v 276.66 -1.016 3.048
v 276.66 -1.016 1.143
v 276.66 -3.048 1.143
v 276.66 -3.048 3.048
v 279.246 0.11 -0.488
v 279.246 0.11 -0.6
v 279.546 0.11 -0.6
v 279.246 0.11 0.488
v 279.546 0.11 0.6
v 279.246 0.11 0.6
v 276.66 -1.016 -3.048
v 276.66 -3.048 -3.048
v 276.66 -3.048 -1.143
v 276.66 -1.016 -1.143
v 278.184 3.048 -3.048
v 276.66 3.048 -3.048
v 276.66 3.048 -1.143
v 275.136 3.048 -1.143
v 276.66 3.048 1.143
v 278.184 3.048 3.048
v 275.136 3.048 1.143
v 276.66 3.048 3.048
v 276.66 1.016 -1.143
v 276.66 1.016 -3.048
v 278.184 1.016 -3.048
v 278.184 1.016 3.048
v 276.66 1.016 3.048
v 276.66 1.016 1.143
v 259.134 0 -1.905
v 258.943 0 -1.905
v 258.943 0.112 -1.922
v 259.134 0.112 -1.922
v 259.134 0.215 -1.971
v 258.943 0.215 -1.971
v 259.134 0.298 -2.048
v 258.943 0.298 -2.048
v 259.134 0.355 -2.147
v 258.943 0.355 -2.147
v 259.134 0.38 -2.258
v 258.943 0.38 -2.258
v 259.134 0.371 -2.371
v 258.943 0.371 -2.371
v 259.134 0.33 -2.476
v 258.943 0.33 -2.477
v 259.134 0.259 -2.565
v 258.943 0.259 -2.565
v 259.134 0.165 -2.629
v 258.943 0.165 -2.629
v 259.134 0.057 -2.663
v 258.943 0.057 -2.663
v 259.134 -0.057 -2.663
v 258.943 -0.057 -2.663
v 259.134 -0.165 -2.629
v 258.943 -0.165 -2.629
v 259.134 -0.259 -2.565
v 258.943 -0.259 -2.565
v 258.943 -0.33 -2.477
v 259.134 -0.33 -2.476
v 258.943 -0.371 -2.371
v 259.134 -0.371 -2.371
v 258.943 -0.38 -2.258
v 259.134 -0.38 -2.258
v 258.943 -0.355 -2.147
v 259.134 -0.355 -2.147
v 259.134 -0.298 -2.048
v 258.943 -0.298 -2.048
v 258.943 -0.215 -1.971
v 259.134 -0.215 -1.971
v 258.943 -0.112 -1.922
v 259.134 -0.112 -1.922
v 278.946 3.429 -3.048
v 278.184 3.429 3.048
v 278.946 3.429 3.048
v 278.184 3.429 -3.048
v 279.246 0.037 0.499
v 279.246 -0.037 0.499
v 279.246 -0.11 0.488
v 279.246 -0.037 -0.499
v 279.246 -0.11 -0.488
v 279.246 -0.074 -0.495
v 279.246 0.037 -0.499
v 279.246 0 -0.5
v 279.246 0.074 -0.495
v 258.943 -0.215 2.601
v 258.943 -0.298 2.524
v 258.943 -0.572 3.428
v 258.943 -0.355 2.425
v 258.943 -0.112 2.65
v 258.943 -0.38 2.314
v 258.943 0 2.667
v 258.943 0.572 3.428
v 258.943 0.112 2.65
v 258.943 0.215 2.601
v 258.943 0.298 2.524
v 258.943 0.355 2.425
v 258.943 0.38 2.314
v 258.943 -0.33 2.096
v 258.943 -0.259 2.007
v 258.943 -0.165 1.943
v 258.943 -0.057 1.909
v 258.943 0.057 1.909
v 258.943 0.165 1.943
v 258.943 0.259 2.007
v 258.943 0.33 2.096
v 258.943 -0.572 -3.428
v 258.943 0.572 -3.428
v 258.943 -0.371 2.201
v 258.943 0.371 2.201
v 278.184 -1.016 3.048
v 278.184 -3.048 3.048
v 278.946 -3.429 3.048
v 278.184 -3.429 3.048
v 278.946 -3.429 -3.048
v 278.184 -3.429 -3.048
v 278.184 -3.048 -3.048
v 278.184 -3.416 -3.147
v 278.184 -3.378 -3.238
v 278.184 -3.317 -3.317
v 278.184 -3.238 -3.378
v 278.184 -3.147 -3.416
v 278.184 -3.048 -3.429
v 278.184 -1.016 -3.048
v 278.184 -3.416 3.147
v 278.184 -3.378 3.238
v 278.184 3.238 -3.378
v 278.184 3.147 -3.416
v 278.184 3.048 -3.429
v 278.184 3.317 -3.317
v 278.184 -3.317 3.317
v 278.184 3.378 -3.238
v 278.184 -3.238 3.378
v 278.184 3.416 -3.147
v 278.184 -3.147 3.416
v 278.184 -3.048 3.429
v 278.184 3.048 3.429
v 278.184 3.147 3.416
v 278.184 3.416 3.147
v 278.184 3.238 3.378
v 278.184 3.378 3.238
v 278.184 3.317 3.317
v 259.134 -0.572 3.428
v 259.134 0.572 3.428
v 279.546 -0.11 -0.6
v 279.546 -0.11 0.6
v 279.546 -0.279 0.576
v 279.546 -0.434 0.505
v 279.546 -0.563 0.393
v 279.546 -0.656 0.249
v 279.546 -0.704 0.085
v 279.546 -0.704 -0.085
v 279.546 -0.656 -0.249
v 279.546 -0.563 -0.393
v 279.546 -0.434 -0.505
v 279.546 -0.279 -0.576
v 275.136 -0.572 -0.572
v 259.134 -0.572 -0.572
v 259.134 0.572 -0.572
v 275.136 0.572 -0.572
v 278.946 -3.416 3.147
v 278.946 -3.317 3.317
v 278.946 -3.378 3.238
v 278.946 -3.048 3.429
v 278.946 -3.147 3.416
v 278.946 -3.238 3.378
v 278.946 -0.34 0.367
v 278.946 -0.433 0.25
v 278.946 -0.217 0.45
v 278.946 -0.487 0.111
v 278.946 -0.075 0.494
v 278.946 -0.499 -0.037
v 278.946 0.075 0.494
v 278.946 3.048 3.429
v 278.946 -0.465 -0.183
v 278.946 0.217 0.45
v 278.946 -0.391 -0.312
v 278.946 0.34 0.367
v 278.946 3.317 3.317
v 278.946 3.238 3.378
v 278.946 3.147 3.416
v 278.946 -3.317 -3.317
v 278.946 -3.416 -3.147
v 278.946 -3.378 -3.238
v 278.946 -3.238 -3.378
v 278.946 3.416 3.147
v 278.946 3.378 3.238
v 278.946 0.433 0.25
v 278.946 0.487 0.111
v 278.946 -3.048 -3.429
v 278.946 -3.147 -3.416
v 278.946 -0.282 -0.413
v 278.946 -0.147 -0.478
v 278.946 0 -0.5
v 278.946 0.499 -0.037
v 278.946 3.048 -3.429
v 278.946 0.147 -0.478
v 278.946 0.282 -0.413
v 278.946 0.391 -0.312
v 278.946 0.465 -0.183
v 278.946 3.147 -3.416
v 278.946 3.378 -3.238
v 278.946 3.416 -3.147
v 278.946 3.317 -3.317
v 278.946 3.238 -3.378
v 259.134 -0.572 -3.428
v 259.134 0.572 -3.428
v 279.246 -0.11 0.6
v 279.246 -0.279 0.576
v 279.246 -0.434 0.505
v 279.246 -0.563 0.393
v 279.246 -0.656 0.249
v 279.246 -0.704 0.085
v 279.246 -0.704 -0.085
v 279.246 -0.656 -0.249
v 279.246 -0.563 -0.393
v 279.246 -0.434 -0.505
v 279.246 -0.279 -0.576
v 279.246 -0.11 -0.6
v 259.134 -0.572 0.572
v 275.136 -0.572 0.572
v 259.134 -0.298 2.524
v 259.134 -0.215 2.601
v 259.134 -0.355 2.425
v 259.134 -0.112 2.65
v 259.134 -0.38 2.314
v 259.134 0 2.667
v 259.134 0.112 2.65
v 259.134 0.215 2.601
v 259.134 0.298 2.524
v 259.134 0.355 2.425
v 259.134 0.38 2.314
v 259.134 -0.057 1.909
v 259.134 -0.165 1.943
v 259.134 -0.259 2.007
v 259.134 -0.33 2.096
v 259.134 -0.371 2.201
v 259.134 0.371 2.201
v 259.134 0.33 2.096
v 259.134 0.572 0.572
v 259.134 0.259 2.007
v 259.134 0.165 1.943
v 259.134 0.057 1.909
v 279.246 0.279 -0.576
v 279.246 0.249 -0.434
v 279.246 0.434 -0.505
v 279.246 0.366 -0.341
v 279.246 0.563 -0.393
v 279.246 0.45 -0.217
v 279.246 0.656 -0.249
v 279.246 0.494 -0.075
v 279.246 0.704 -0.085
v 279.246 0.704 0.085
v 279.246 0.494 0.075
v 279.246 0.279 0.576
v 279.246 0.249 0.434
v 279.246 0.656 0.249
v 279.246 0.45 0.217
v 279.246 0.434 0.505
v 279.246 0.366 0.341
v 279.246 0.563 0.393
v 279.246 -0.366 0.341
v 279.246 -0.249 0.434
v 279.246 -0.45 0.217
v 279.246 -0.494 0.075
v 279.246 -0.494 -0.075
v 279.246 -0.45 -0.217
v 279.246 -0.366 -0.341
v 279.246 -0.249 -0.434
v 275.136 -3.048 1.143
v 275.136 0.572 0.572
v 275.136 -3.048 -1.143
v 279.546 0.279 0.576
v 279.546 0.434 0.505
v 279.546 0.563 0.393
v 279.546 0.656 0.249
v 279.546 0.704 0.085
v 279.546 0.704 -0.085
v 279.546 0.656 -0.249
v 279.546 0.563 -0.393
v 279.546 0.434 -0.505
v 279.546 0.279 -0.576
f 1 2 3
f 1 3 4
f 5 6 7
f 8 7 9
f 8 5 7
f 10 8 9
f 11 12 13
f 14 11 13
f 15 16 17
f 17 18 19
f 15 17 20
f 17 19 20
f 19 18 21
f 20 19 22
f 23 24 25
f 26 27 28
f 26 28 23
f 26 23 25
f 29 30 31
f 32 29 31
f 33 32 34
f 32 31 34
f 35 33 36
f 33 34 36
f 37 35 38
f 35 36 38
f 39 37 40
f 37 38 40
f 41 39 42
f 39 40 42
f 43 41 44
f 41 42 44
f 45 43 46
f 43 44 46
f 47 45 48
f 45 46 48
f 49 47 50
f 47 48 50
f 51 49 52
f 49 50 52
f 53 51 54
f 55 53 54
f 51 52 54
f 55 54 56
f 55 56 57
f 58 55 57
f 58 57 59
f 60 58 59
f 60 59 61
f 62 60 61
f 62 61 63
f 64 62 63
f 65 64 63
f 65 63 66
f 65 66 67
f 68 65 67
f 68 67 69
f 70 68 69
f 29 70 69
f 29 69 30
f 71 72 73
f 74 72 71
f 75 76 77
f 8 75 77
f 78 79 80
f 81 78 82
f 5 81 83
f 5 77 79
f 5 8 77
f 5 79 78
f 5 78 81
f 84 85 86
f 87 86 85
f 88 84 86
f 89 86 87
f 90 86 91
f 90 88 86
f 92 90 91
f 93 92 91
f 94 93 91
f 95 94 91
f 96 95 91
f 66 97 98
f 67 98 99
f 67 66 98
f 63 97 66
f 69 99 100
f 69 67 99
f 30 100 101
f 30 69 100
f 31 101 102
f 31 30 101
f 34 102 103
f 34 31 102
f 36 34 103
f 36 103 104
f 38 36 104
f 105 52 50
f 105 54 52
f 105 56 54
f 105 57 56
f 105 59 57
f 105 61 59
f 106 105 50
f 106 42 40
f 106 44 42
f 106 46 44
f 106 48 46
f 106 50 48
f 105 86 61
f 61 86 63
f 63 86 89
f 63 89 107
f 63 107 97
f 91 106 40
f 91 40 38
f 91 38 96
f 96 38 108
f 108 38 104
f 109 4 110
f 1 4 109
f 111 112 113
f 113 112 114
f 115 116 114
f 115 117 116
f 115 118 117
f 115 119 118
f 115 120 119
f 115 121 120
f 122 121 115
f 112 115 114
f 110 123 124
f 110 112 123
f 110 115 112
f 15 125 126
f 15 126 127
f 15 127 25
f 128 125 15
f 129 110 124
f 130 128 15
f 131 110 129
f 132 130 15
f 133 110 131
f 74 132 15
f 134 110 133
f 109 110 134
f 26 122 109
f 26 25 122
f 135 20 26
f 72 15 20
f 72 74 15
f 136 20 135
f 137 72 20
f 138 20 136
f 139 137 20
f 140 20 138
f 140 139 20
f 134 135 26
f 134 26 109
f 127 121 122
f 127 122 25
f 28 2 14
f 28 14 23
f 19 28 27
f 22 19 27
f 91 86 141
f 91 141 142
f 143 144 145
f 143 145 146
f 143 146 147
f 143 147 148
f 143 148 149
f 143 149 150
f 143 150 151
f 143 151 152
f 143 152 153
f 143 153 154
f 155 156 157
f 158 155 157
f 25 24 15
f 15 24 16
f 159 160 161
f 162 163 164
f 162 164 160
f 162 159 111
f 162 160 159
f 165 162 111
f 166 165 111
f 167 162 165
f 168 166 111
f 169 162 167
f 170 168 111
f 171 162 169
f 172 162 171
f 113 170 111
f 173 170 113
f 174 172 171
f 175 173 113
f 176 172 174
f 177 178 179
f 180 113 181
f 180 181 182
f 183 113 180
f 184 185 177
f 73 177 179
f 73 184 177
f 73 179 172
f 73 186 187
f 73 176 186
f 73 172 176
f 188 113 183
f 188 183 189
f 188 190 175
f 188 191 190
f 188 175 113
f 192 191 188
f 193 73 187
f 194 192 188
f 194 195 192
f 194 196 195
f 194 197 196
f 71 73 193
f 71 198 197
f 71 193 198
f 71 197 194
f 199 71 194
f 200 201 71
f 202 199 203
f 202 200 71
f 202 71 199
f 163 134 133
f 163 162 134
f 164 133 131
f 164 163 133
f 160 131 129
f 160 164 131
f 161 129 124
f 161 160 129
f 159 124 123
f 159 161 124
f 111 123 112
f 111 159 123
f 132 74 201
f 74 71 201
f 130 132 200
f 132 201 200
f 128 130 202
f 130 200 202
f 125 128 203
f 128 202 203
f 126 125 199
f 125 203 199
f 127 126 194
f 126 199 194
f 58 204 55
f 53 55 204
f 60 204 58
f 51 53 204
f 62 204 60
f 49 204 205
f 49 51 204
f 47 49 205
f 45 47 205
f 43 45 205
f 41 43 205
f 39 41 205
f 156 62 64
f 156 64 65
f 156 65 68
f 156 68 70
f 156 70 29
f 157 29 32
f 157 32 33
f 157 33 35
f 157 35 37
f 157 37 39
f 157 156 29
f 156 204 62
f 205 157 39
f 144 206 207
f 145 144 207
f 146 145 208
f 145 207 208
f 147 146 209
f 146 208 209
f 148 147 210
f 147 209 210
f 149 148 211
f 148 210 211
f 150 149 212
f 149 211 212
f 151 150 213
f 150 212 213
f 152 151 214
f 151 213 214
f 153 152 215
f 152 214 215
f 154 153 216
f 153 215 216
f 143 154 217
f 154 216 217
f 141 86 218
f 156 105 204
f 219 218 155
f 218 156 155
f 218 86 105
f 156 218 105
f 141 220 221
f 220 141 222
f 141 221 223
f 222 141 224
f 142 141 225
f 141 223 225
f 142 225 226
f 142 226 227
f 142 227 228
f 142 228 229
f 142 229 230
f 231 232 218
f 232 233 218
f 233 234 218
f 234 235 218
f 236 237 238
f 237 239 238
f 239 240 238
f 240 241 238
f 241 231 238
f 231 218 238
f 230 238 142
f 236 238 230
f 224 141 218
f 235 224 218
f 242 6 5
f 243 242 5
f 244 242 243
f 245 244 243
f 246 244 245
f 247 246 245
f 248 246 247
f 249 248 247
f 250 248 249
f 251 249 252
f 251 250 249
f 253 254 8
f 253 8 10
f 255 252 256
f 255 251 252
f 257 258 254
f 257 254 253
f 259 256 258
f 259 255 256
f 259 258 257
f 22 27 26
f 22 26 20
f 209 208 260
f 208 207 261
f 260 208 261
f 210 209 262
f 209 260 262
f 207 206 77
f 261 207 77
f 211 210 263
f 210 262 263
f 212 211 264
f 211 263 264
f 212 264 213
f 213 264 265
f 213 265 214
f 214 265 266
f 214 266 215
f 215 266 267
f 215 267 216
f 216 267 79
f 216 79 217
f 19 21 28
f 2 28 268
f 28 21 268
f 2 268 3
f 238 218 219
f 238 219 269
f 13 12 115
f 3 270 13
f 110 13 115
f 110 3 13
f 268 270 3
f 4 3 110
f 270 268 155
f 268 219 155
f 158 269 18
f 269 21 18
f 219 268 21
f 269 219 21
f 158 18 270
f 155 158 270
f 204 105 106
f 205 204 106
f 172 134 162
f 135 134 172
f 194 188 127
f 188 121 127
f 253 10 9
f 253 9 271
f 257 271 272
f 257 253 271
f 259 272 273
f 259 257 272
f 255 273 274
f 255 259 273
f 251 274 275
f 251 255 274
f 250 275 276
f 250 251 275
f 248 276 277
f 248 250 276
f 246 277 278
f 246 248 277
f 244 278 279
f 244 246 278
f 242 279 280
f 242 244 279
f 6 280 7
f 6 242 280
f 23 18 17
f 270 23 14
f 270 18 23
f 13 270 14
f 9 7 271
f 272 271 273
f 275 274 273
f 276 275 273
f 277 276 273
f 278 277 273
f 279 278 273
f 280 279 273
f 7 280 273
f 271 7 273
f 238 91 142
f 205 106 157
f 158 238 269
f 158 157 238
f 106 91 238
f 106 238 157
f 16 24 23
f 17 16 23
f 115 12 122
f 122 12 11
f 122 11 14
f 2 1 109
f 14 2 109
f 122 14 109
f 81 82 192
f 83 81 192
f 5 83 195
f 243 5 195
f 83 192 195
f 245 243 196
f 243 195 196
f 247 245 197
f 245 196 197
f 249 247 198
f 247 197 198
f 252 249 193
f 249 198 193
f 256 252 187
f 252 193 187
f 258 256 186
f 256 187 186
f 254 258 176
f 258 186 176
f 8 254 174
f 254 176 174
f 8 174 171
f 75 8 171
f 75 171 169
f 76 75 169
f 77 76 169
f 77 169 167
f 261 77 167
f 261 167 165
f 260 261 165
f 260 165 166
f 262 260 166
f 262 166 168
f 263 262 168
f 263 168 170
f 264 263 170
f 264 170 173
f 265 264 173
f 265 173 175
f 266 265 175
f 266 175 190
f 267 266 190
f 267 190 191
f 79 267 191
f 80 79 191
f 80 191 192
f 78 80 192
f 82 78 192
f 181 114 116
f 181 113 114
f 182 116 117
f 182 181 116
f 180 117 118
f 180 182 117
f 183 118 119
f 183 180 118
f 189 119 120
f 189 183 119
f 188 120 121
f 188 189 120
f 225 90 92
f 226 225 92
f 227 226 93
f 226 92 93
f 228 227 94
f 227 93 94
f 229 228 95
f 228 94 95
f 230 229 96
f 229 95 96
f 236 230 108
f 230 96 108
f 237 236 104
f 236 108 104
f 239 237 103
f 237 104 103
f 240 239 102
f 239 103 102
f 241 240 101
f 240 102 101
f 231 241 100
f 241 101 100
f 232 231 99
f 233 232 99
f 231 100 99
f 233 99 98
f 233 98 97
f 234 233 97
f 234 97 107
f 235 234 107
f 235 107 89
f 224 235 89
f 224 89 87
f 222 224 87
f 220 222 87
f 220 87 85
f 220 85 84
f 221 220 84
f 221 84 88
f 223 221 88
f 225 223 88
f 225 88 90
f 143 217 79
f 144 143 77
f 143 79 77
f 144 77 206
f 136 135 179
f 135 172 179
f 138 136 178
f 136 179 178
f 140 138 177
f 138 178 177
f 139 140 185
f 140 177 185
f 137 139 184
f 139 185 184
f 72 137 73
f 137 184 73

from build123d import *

# Parameters (mm, degrees)
SKETCH1_W           = 101.6
SKETCH1_H           = 19.05
BOSS_EXTRUDE1_DEPTH = 3.175
SKETCH2_W           = 19.05
SKETCH2_H           = 19.05
BOSS_EXTRUDE2_DEPTH = 266.7
SKETCH4_W           = 114.3
SKETCH4_H           = 114.3
BOSS_EXTRUDE3_DEPTH = 76.2
SKETCH5_W           = 25.4
SKETCH5_H           = 38.1
CUT_EXTRUDE2_DEPTH  = 150.368
SKETCH7_OUTSIDE_W   = 192.692
SKETCH7_OUTSIDE_H   = 192.692
SKETCH7_OUTSIDE_W_2 = 101.6
SKETCH7_OUTSIDE_H_2 = 101.6
CUT_EXTRUDE3_DEPTH  = 50.8
SKETCH8_W           = 25.4
SKETCH8_H           = 33.866666666
CUT_EXTRUDE4_DEPTH  = 140.208
SKETCH9_W           = 114.3
SKETCH9_H           = 114.3
CUT_EXTRUDE5_DEPTH  = 12.7
FILLET2_R           = 6.35
SKETCH10_R          = 6.35
CUT_EXTRUDE6_DEPTH  = 12.7
SCALE1_SCALE        = 0.06
MOVE_FACE1_BY       = 0.380000002
MOVE_FACE1_2_BY     = 0.380000002
SKETCH12_R          = 0.5
BOSS_EXTRUDE4_DEPTH = 0.3
BOSS_EXTRUDE5_DEPTH = 0.3


with BuildPart() as part:
    # Sketch1 → Boss-Extrude1 (new body)
    with BuildSketch(Plane(origin=(0, 0, 0), x_dir=(0, 0, -1), z_dir=(1, 0, 0))):
        Rectangle(SKETCH1_W, SKETCH1_H)
    extrude(amount=BOSS_EXTRUDE1_DEPTH)

    # Sketch2 → Boss-Extrude2 (add)
    with BuildSketch(Plane(origin=(3.175, 0, 0), x_dir=(0, 0, -1), z_dir=(1, 0, 0))):
        Rectangle(SKETCH2_W, SKETCH2_H)
    extrude(amount=BOSS_EXTRUDE2_DEPTH)

    # Sketch4 → Boss-Extrude3 (add)
    with BuildSketch(Plane(origin=(269.875, 0, 0), x_dir=(0, 0, -1), z_dir=(1, 0, 0))):
        Rectangle(SKETCH4_W, SKETCH4_H)
    extrude(amount=BOSS_EXTRUDE3_DEPTH)

    # Sketch5 → Cut-Extrude2 (cut)
    with BuildSketch(Plane.XZ.offset(57.15)):
        with Locations((282.575, 38.1)):
            Rectangle(SKETCH5_W, SKETCH5_H)
        with Locations((282.575, -38.1)):
            Rectangle(SKETCH5_W, SKETCH5_H)
    extrude(amount=-CUT_EXTRUDE2_DEPTH, mode=Mode.SUBTRACT)

    # Sketch7 outside → Cut-Extrude3 (cut)
    with BuildSketch(Plane.ZY.offset(-269.875)):
        Rectangle(SKETCH7_OUTSIDE_W, SKETCH7_OUTSIDE_H)
        Rectangle(SKETCH7_OUTSIDE_W_2, SKETCH7_OUTSIDE_H_2, mode=Mode.SUBTRACT)
    extrude(amount=-CUT_EXTRUDE3_DEPTH, mode=Mode.SUBTRACT)

    # Sketch8 → Cut-Extrude4 (cut)
    with BuildSketch(Plane.XY.offset(50.8)):
        with Locations((307.975, 0)):
            Rectangle(SKETCH8_W, SKETCH8_H)
    extrude(amount=-CUT_EXTRUDE4_DEPTH, mode=Mode.SUBTRACT)

    # Sketch9 → Cut-Extrude5 (cut)
    with BuildSketch(Plane(origin=(346.075, 0, 0), x_dir=(0, 0, -1), z_dir=(1, 0, 0))):
        Rectangle(SKETCH9_W, SKETCH9_H)
    extrude(amount=-CUT_EXTRUDE5_DEPTH, mode=Mode.SUBTRACT)

    # Fillet2
    fillet2_edges = [part.edges().sort_by_distance(p)[0] for p in [
        (327.025, -57.15, 57.15),
        (327.025, 57.15, 57.15),
        (327.025, -57.15, -57.15),
        (327.025, 57.15, -57.15),
    ]]
    fillet(fillet2_edges, radius=FILLET2_R)

    # Sketch10 → Cut-Extrude6 (cut)
    with BuildSketch(Plane.ZY):
        with Locations((-38.1, 0)):
            Circle(SKETCH10_R)
        with Locations((38.1, 0)):
            Circle(SKETCH10_R)
    extrude(amount=-CUT_EXTRUDE6_DEPTH, mode=Mode.SUBTRACT)


with BuildPart() as part_1:
    # Scale1: scaled about (275.471689012, 0, 0)
    add(part.part.scale(SCALE1_SCALE).moved(Location((258.943387671, 0, 0))))

    # Move Face1: a face moved outward by 0.38
    extrude(part_1.faces().sort_by_distance((259.038637671, 0, -3.048))[0], amount=MOVE_FACE1_BY, dir=(0, 0, -1))

    # Move Face1 2: a face moved outward by 0.38
    extrude(part_1.faces().sort_by_distance((259.038637671, 0, 3.048))[0], amount=MOVE_FACE1_2_BY, dir=(0, 0, 1))

    # Sketch12 → Boss-Extrude4 (add)
    with BuildSketch(Plane(origin=(278.945887671, 0, 0), x_dir=(0, 0, -1), z_dir=(1, 0, 0))):
        Circle(SKETCH12_R)
    extrude(amount=BOSS_EXTRUDE4_DEPTH)

    # Sketch13 → Boss-Extrude5 (add)
    with BuildSketch(Plane(origin=(279.245887671, 0, 0), x_dir=(0, 0, -1), z_dir=(1, 0, 0))):
        with BuildLine():
            Line((0.6, 0.11), (-0.6, 0.11))
            ThreePointArc((-0.6, 0.11), (0, 0.71), (0.6, 0.11))
        make_face()
        with BuildLine():
            Line((0.6, -0.11), (-0.6, -0.11))
            ThreePointArc((-0.6, -0.11), (0, -0.71), (0.6, -0.11))
        make_face()
    extrude(amount=BOSS_EXTRUDE5_DEPTH)


solid = part_1.part
